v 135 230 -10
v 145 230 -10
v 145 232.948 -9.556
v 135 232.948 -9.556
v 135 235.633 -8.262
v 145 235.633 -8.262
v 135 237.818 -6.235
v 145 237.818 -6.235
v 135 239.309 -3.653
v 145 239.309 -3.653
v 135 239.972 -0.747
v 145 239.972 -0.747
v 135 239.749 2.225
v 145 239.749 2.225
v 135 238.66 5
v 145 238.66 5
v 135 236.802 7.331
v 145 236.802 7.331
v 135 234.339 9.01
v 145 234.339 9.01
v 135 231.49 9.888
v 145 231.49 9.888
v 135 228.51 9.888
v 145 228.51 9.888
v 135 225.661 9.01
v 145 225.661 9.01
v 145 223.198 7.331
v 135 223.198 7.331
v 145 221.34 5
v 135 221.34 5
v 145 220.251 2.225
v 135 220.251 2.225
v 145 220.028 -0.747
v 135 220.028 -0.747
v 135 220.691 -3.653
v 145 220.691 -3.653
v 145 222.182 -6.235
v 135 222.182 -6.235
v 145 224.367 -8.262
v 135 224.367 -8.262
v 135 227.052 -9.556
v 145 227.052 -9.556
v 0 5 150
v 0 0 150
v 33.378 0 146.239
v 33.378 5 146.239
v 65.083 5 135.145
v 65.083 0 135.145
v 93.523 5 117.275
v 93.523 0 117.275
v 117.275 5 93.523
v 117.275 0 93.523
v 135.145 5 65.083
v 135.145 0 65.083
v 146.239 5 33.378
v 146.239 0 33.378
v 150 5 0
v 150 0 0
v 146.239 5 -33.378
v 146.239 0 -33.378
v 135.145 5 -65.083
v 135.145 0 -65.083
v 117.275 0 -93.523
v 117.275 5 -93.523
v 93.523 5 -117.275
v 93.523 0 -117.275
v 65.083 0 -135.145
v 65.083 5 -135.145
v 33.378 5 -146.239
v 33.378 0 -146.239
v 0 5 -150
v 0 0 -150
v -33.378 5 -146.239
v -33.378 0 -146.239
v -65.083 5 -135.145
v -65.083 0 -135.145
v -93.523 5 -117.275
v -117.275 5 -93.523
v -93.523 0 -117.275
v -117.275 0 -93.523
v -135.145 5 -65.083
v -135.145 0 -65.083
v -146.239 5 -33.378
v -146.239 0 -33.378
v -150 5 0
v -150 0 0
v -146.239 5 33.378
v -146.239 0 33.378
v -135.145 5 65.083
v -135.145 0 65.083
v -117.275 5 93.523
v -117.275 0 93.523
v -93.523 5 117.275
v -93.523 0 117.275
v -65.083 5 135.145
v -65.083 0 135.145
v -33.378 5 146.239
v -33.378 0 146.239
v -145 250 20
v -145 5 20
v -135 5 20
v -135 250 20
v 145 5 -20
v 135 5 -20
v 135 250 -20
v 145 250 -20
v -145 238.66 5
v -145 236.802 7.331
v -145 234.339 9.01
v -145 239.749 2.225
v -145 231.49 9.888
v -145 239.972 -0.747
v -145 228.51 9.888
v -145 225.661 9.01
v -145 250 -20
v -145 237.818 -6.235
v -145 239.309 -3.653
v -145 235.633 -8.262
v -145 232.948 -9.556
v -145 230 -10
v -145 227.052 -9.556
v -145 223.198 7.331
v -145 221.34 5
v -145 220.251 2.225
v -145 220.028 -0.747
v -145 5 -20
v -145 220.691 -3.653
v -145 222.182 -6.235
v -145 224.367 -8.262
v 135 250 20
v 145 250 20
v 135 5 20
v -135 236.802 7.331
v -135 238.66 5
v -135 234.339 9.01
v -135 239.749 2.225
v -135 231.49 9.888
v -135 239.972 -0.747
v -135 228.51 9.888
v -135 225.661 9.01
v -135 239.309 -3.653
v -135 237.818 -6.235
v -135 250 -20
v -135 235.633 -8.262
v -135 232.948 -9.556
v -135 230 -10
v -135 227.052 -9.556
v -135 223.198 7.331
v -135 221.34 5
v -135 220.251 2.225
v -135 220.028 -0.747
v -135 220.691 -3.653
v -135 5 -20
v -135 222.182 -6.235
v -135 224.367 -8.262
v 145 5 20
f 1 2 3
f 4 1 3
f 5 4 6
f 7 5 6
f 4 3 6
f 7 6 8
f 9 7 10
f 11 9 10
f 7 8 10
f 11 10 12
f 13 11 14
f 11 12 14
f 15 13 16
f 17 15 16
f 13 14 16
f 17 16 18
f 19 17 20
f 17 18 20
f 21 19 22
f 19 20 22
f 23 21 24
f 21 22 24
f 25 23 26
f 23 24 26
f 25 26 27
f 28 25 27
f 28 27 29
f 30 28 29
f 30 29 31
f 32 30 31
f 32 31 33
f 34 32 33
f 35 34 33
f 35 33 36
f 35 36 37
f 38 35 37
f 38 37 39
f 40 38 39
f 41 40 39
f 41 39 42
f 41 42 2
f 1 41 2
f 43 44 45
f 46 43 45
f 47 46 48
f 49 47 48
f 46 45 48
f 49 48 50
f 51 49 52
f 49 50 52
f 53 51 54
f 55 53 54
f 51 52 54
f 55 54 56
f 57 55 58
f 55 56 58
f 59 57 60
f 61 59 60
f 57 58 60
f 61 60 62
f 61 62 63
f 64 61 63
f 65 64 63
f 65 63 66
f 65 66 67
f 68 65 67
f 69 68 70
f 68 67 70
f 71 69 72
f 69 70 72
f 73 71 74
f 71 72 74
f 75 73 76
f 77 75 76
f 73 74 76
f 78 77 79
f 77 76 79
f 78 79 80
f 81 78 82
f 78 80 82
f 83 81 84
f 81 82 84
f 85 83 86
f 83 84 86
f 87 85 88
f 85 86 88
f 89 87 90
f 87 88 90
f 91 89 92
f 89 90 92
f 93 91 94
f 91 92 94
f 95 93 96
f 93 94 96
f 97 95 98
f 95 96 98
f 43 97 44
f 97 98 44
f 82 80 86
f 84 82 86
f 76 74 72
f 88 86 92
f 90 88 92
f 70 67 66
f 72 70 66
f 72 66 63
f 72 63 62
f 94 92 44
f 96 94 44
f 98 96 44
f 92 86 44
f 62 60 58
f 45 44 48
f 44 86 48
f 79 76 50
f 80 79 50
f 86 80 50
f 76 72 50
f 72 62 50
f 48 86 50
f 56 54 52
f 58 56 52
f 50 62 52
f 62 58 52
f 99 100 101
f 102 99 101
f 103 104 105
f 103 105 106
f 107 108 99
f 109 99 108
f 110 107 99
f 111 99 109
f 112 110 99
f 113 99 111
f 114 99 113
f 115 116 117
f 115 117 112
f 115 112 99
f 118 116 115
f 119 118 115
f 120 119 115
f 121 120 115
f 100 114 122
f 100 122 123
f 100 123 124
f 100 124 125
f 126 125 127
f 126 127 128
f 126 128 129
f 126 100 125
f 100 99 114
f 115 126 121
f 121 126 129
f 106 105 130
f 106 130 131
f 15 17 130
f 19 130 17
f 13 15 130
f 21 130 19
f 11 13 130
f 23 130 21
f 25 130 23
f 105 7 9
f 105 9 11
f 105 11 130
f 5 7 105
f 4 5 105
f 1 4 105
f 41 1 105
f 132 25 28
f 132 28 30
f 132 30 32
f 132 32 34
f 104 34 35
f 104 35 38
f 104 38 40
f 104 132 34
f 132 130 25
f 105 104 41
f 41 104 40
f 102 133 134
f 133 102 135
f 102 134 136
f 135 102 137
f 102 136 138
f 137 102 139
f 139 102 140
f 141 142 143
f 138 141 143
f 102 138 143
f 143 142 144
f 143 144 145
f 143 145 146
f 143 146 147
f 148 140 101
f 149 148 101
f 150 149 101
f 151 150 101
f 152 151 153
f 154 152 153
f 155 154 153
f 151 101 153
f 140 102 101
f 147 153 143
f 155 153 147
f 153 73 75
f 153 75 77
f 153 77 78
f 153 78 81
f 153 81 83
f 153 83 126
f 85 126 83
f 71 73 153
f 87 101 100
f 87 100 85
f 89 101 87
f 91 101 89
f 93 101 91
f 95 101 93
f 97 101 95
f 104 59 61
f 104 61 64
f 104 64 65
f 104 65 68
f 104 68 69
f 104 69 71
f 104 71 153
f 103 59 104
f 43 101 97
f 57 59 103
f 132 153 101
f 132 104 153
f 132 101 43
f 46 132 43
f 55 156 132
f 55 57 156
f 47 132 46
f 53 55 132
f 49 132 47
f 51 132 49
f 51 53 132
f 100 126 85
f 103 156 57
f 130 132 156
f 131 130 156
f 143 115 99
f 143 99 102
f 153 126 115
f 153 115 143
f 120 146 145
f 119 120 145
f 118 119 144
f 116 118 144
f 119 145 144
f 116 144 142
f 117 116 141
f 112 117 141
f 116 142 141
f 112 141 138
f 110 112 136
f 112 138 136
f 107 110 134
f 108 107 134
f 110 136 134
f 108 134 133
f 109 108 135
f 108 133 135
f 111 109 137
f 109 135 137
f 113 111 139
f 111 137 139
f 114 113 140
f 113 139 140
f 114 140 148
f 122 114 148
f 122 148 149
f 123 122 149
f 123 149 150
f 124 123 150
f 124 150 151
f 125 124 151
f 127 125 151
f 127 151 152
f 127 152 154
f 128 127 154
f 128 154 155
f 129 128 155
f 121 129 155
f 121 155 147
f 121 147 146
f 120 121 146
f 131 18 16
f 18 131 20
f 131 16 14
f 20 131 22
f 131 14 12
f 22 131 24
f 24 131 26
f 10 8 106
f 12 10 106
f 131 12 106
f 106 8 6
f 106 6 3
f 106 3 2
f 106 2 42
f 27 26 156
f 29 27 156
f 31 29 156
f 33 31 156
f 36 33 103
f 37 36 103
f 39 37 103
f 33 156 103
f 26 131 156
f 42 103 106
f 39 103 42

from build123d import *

# Parameters (mm, degrees)
SZKIC1_W                      = 10
SZKIC1_H                      = 40
DODANIE_WYCI_GNI_CIE1_DEPTH   = 250
DODANIE_WYCI_GNI_CIE1_2_DEPTH = 250
SZKIC1_3_R                    = 150
DODANIE_WYCI_GNI_CIE2_DEPTH   = 5
SZKIC2_R                      = 10
WYTNIJ_WYCI_GNI_CIE1_DEPTH    = 290


with BuildPart() as part:
    # Szkic1 → Dodanie-wyciągnięcie1 (new body)
    with BuildSketch(Plane(origin=(0, 0, 0), x_dir=(1, 0, 0), z_dir=(0, 1, 0))):
        with Locations((140, 0)):
            Rectangle(SZKIC1_W, SZKIC1_H)
    extrude(amount=DODANIE_WYCI_GNI_CIE1_DEPTH)



with BuildPart() as body_2:
    # Szkic1 → Dodanie-wyci_gni_cie1 2 (new body)
    with BuildSketch(Plane(origin=(0, 0, 0), x_dir=(1, 0, 0), z_dir=(0, 1, 0))):
        with Locations((-140, 0)):
            Rectangle(SZKIC1_W, SZKIC1_H)
    extrude(amount=DODANIE_WYCI_GNI_CIE1_2_DEPTH)


with BuildPart() as part_1:
    add(part.part)

    add(body_2.part)  # Dodanie-wyciągnięcie2 merges body 2
    # Szkic1<3> → Dodanie-wyciągnięcie2 (add)
    with BuildSketch(Plane(origin=(0, 0, 0), x_dir=(1, 0, 0), z_dir=(0, 1, 0))):
        Circle(SZKIC1_3_R)
        Polygon((-135, 20), (-135, 0), (-135, -20), (-140, -20), (-145, -20), (-145, 20), (-140, 20), align=None, mode=Mode.SUBTRACT)
        Polygon((135, -20), (135, 0), (135, 20), (140, 20), (145, 20), (145, -20), (140, -20), align=None, mode=Mode.SUBTRACT)
    extrude(amount=DODANIE_WYCI_GNI_CIE2_DEPTH)

    # Szkic2 → Wytnij-wyciągnięcie1 (cut)
    with BuildSketch(Plane(origin=(145, 0, 0), x_dir=(0, 0, -1), z_dir=(1, 0, 0))):
        with Locations((0, 230)):
            Circle(SZKIC2_R)
    extrude(amount=-WYTNIJ_WYCI_GNI_CIE1_DEPTH, mode=Mode.SUBTRACT)


solid = part_1.part
